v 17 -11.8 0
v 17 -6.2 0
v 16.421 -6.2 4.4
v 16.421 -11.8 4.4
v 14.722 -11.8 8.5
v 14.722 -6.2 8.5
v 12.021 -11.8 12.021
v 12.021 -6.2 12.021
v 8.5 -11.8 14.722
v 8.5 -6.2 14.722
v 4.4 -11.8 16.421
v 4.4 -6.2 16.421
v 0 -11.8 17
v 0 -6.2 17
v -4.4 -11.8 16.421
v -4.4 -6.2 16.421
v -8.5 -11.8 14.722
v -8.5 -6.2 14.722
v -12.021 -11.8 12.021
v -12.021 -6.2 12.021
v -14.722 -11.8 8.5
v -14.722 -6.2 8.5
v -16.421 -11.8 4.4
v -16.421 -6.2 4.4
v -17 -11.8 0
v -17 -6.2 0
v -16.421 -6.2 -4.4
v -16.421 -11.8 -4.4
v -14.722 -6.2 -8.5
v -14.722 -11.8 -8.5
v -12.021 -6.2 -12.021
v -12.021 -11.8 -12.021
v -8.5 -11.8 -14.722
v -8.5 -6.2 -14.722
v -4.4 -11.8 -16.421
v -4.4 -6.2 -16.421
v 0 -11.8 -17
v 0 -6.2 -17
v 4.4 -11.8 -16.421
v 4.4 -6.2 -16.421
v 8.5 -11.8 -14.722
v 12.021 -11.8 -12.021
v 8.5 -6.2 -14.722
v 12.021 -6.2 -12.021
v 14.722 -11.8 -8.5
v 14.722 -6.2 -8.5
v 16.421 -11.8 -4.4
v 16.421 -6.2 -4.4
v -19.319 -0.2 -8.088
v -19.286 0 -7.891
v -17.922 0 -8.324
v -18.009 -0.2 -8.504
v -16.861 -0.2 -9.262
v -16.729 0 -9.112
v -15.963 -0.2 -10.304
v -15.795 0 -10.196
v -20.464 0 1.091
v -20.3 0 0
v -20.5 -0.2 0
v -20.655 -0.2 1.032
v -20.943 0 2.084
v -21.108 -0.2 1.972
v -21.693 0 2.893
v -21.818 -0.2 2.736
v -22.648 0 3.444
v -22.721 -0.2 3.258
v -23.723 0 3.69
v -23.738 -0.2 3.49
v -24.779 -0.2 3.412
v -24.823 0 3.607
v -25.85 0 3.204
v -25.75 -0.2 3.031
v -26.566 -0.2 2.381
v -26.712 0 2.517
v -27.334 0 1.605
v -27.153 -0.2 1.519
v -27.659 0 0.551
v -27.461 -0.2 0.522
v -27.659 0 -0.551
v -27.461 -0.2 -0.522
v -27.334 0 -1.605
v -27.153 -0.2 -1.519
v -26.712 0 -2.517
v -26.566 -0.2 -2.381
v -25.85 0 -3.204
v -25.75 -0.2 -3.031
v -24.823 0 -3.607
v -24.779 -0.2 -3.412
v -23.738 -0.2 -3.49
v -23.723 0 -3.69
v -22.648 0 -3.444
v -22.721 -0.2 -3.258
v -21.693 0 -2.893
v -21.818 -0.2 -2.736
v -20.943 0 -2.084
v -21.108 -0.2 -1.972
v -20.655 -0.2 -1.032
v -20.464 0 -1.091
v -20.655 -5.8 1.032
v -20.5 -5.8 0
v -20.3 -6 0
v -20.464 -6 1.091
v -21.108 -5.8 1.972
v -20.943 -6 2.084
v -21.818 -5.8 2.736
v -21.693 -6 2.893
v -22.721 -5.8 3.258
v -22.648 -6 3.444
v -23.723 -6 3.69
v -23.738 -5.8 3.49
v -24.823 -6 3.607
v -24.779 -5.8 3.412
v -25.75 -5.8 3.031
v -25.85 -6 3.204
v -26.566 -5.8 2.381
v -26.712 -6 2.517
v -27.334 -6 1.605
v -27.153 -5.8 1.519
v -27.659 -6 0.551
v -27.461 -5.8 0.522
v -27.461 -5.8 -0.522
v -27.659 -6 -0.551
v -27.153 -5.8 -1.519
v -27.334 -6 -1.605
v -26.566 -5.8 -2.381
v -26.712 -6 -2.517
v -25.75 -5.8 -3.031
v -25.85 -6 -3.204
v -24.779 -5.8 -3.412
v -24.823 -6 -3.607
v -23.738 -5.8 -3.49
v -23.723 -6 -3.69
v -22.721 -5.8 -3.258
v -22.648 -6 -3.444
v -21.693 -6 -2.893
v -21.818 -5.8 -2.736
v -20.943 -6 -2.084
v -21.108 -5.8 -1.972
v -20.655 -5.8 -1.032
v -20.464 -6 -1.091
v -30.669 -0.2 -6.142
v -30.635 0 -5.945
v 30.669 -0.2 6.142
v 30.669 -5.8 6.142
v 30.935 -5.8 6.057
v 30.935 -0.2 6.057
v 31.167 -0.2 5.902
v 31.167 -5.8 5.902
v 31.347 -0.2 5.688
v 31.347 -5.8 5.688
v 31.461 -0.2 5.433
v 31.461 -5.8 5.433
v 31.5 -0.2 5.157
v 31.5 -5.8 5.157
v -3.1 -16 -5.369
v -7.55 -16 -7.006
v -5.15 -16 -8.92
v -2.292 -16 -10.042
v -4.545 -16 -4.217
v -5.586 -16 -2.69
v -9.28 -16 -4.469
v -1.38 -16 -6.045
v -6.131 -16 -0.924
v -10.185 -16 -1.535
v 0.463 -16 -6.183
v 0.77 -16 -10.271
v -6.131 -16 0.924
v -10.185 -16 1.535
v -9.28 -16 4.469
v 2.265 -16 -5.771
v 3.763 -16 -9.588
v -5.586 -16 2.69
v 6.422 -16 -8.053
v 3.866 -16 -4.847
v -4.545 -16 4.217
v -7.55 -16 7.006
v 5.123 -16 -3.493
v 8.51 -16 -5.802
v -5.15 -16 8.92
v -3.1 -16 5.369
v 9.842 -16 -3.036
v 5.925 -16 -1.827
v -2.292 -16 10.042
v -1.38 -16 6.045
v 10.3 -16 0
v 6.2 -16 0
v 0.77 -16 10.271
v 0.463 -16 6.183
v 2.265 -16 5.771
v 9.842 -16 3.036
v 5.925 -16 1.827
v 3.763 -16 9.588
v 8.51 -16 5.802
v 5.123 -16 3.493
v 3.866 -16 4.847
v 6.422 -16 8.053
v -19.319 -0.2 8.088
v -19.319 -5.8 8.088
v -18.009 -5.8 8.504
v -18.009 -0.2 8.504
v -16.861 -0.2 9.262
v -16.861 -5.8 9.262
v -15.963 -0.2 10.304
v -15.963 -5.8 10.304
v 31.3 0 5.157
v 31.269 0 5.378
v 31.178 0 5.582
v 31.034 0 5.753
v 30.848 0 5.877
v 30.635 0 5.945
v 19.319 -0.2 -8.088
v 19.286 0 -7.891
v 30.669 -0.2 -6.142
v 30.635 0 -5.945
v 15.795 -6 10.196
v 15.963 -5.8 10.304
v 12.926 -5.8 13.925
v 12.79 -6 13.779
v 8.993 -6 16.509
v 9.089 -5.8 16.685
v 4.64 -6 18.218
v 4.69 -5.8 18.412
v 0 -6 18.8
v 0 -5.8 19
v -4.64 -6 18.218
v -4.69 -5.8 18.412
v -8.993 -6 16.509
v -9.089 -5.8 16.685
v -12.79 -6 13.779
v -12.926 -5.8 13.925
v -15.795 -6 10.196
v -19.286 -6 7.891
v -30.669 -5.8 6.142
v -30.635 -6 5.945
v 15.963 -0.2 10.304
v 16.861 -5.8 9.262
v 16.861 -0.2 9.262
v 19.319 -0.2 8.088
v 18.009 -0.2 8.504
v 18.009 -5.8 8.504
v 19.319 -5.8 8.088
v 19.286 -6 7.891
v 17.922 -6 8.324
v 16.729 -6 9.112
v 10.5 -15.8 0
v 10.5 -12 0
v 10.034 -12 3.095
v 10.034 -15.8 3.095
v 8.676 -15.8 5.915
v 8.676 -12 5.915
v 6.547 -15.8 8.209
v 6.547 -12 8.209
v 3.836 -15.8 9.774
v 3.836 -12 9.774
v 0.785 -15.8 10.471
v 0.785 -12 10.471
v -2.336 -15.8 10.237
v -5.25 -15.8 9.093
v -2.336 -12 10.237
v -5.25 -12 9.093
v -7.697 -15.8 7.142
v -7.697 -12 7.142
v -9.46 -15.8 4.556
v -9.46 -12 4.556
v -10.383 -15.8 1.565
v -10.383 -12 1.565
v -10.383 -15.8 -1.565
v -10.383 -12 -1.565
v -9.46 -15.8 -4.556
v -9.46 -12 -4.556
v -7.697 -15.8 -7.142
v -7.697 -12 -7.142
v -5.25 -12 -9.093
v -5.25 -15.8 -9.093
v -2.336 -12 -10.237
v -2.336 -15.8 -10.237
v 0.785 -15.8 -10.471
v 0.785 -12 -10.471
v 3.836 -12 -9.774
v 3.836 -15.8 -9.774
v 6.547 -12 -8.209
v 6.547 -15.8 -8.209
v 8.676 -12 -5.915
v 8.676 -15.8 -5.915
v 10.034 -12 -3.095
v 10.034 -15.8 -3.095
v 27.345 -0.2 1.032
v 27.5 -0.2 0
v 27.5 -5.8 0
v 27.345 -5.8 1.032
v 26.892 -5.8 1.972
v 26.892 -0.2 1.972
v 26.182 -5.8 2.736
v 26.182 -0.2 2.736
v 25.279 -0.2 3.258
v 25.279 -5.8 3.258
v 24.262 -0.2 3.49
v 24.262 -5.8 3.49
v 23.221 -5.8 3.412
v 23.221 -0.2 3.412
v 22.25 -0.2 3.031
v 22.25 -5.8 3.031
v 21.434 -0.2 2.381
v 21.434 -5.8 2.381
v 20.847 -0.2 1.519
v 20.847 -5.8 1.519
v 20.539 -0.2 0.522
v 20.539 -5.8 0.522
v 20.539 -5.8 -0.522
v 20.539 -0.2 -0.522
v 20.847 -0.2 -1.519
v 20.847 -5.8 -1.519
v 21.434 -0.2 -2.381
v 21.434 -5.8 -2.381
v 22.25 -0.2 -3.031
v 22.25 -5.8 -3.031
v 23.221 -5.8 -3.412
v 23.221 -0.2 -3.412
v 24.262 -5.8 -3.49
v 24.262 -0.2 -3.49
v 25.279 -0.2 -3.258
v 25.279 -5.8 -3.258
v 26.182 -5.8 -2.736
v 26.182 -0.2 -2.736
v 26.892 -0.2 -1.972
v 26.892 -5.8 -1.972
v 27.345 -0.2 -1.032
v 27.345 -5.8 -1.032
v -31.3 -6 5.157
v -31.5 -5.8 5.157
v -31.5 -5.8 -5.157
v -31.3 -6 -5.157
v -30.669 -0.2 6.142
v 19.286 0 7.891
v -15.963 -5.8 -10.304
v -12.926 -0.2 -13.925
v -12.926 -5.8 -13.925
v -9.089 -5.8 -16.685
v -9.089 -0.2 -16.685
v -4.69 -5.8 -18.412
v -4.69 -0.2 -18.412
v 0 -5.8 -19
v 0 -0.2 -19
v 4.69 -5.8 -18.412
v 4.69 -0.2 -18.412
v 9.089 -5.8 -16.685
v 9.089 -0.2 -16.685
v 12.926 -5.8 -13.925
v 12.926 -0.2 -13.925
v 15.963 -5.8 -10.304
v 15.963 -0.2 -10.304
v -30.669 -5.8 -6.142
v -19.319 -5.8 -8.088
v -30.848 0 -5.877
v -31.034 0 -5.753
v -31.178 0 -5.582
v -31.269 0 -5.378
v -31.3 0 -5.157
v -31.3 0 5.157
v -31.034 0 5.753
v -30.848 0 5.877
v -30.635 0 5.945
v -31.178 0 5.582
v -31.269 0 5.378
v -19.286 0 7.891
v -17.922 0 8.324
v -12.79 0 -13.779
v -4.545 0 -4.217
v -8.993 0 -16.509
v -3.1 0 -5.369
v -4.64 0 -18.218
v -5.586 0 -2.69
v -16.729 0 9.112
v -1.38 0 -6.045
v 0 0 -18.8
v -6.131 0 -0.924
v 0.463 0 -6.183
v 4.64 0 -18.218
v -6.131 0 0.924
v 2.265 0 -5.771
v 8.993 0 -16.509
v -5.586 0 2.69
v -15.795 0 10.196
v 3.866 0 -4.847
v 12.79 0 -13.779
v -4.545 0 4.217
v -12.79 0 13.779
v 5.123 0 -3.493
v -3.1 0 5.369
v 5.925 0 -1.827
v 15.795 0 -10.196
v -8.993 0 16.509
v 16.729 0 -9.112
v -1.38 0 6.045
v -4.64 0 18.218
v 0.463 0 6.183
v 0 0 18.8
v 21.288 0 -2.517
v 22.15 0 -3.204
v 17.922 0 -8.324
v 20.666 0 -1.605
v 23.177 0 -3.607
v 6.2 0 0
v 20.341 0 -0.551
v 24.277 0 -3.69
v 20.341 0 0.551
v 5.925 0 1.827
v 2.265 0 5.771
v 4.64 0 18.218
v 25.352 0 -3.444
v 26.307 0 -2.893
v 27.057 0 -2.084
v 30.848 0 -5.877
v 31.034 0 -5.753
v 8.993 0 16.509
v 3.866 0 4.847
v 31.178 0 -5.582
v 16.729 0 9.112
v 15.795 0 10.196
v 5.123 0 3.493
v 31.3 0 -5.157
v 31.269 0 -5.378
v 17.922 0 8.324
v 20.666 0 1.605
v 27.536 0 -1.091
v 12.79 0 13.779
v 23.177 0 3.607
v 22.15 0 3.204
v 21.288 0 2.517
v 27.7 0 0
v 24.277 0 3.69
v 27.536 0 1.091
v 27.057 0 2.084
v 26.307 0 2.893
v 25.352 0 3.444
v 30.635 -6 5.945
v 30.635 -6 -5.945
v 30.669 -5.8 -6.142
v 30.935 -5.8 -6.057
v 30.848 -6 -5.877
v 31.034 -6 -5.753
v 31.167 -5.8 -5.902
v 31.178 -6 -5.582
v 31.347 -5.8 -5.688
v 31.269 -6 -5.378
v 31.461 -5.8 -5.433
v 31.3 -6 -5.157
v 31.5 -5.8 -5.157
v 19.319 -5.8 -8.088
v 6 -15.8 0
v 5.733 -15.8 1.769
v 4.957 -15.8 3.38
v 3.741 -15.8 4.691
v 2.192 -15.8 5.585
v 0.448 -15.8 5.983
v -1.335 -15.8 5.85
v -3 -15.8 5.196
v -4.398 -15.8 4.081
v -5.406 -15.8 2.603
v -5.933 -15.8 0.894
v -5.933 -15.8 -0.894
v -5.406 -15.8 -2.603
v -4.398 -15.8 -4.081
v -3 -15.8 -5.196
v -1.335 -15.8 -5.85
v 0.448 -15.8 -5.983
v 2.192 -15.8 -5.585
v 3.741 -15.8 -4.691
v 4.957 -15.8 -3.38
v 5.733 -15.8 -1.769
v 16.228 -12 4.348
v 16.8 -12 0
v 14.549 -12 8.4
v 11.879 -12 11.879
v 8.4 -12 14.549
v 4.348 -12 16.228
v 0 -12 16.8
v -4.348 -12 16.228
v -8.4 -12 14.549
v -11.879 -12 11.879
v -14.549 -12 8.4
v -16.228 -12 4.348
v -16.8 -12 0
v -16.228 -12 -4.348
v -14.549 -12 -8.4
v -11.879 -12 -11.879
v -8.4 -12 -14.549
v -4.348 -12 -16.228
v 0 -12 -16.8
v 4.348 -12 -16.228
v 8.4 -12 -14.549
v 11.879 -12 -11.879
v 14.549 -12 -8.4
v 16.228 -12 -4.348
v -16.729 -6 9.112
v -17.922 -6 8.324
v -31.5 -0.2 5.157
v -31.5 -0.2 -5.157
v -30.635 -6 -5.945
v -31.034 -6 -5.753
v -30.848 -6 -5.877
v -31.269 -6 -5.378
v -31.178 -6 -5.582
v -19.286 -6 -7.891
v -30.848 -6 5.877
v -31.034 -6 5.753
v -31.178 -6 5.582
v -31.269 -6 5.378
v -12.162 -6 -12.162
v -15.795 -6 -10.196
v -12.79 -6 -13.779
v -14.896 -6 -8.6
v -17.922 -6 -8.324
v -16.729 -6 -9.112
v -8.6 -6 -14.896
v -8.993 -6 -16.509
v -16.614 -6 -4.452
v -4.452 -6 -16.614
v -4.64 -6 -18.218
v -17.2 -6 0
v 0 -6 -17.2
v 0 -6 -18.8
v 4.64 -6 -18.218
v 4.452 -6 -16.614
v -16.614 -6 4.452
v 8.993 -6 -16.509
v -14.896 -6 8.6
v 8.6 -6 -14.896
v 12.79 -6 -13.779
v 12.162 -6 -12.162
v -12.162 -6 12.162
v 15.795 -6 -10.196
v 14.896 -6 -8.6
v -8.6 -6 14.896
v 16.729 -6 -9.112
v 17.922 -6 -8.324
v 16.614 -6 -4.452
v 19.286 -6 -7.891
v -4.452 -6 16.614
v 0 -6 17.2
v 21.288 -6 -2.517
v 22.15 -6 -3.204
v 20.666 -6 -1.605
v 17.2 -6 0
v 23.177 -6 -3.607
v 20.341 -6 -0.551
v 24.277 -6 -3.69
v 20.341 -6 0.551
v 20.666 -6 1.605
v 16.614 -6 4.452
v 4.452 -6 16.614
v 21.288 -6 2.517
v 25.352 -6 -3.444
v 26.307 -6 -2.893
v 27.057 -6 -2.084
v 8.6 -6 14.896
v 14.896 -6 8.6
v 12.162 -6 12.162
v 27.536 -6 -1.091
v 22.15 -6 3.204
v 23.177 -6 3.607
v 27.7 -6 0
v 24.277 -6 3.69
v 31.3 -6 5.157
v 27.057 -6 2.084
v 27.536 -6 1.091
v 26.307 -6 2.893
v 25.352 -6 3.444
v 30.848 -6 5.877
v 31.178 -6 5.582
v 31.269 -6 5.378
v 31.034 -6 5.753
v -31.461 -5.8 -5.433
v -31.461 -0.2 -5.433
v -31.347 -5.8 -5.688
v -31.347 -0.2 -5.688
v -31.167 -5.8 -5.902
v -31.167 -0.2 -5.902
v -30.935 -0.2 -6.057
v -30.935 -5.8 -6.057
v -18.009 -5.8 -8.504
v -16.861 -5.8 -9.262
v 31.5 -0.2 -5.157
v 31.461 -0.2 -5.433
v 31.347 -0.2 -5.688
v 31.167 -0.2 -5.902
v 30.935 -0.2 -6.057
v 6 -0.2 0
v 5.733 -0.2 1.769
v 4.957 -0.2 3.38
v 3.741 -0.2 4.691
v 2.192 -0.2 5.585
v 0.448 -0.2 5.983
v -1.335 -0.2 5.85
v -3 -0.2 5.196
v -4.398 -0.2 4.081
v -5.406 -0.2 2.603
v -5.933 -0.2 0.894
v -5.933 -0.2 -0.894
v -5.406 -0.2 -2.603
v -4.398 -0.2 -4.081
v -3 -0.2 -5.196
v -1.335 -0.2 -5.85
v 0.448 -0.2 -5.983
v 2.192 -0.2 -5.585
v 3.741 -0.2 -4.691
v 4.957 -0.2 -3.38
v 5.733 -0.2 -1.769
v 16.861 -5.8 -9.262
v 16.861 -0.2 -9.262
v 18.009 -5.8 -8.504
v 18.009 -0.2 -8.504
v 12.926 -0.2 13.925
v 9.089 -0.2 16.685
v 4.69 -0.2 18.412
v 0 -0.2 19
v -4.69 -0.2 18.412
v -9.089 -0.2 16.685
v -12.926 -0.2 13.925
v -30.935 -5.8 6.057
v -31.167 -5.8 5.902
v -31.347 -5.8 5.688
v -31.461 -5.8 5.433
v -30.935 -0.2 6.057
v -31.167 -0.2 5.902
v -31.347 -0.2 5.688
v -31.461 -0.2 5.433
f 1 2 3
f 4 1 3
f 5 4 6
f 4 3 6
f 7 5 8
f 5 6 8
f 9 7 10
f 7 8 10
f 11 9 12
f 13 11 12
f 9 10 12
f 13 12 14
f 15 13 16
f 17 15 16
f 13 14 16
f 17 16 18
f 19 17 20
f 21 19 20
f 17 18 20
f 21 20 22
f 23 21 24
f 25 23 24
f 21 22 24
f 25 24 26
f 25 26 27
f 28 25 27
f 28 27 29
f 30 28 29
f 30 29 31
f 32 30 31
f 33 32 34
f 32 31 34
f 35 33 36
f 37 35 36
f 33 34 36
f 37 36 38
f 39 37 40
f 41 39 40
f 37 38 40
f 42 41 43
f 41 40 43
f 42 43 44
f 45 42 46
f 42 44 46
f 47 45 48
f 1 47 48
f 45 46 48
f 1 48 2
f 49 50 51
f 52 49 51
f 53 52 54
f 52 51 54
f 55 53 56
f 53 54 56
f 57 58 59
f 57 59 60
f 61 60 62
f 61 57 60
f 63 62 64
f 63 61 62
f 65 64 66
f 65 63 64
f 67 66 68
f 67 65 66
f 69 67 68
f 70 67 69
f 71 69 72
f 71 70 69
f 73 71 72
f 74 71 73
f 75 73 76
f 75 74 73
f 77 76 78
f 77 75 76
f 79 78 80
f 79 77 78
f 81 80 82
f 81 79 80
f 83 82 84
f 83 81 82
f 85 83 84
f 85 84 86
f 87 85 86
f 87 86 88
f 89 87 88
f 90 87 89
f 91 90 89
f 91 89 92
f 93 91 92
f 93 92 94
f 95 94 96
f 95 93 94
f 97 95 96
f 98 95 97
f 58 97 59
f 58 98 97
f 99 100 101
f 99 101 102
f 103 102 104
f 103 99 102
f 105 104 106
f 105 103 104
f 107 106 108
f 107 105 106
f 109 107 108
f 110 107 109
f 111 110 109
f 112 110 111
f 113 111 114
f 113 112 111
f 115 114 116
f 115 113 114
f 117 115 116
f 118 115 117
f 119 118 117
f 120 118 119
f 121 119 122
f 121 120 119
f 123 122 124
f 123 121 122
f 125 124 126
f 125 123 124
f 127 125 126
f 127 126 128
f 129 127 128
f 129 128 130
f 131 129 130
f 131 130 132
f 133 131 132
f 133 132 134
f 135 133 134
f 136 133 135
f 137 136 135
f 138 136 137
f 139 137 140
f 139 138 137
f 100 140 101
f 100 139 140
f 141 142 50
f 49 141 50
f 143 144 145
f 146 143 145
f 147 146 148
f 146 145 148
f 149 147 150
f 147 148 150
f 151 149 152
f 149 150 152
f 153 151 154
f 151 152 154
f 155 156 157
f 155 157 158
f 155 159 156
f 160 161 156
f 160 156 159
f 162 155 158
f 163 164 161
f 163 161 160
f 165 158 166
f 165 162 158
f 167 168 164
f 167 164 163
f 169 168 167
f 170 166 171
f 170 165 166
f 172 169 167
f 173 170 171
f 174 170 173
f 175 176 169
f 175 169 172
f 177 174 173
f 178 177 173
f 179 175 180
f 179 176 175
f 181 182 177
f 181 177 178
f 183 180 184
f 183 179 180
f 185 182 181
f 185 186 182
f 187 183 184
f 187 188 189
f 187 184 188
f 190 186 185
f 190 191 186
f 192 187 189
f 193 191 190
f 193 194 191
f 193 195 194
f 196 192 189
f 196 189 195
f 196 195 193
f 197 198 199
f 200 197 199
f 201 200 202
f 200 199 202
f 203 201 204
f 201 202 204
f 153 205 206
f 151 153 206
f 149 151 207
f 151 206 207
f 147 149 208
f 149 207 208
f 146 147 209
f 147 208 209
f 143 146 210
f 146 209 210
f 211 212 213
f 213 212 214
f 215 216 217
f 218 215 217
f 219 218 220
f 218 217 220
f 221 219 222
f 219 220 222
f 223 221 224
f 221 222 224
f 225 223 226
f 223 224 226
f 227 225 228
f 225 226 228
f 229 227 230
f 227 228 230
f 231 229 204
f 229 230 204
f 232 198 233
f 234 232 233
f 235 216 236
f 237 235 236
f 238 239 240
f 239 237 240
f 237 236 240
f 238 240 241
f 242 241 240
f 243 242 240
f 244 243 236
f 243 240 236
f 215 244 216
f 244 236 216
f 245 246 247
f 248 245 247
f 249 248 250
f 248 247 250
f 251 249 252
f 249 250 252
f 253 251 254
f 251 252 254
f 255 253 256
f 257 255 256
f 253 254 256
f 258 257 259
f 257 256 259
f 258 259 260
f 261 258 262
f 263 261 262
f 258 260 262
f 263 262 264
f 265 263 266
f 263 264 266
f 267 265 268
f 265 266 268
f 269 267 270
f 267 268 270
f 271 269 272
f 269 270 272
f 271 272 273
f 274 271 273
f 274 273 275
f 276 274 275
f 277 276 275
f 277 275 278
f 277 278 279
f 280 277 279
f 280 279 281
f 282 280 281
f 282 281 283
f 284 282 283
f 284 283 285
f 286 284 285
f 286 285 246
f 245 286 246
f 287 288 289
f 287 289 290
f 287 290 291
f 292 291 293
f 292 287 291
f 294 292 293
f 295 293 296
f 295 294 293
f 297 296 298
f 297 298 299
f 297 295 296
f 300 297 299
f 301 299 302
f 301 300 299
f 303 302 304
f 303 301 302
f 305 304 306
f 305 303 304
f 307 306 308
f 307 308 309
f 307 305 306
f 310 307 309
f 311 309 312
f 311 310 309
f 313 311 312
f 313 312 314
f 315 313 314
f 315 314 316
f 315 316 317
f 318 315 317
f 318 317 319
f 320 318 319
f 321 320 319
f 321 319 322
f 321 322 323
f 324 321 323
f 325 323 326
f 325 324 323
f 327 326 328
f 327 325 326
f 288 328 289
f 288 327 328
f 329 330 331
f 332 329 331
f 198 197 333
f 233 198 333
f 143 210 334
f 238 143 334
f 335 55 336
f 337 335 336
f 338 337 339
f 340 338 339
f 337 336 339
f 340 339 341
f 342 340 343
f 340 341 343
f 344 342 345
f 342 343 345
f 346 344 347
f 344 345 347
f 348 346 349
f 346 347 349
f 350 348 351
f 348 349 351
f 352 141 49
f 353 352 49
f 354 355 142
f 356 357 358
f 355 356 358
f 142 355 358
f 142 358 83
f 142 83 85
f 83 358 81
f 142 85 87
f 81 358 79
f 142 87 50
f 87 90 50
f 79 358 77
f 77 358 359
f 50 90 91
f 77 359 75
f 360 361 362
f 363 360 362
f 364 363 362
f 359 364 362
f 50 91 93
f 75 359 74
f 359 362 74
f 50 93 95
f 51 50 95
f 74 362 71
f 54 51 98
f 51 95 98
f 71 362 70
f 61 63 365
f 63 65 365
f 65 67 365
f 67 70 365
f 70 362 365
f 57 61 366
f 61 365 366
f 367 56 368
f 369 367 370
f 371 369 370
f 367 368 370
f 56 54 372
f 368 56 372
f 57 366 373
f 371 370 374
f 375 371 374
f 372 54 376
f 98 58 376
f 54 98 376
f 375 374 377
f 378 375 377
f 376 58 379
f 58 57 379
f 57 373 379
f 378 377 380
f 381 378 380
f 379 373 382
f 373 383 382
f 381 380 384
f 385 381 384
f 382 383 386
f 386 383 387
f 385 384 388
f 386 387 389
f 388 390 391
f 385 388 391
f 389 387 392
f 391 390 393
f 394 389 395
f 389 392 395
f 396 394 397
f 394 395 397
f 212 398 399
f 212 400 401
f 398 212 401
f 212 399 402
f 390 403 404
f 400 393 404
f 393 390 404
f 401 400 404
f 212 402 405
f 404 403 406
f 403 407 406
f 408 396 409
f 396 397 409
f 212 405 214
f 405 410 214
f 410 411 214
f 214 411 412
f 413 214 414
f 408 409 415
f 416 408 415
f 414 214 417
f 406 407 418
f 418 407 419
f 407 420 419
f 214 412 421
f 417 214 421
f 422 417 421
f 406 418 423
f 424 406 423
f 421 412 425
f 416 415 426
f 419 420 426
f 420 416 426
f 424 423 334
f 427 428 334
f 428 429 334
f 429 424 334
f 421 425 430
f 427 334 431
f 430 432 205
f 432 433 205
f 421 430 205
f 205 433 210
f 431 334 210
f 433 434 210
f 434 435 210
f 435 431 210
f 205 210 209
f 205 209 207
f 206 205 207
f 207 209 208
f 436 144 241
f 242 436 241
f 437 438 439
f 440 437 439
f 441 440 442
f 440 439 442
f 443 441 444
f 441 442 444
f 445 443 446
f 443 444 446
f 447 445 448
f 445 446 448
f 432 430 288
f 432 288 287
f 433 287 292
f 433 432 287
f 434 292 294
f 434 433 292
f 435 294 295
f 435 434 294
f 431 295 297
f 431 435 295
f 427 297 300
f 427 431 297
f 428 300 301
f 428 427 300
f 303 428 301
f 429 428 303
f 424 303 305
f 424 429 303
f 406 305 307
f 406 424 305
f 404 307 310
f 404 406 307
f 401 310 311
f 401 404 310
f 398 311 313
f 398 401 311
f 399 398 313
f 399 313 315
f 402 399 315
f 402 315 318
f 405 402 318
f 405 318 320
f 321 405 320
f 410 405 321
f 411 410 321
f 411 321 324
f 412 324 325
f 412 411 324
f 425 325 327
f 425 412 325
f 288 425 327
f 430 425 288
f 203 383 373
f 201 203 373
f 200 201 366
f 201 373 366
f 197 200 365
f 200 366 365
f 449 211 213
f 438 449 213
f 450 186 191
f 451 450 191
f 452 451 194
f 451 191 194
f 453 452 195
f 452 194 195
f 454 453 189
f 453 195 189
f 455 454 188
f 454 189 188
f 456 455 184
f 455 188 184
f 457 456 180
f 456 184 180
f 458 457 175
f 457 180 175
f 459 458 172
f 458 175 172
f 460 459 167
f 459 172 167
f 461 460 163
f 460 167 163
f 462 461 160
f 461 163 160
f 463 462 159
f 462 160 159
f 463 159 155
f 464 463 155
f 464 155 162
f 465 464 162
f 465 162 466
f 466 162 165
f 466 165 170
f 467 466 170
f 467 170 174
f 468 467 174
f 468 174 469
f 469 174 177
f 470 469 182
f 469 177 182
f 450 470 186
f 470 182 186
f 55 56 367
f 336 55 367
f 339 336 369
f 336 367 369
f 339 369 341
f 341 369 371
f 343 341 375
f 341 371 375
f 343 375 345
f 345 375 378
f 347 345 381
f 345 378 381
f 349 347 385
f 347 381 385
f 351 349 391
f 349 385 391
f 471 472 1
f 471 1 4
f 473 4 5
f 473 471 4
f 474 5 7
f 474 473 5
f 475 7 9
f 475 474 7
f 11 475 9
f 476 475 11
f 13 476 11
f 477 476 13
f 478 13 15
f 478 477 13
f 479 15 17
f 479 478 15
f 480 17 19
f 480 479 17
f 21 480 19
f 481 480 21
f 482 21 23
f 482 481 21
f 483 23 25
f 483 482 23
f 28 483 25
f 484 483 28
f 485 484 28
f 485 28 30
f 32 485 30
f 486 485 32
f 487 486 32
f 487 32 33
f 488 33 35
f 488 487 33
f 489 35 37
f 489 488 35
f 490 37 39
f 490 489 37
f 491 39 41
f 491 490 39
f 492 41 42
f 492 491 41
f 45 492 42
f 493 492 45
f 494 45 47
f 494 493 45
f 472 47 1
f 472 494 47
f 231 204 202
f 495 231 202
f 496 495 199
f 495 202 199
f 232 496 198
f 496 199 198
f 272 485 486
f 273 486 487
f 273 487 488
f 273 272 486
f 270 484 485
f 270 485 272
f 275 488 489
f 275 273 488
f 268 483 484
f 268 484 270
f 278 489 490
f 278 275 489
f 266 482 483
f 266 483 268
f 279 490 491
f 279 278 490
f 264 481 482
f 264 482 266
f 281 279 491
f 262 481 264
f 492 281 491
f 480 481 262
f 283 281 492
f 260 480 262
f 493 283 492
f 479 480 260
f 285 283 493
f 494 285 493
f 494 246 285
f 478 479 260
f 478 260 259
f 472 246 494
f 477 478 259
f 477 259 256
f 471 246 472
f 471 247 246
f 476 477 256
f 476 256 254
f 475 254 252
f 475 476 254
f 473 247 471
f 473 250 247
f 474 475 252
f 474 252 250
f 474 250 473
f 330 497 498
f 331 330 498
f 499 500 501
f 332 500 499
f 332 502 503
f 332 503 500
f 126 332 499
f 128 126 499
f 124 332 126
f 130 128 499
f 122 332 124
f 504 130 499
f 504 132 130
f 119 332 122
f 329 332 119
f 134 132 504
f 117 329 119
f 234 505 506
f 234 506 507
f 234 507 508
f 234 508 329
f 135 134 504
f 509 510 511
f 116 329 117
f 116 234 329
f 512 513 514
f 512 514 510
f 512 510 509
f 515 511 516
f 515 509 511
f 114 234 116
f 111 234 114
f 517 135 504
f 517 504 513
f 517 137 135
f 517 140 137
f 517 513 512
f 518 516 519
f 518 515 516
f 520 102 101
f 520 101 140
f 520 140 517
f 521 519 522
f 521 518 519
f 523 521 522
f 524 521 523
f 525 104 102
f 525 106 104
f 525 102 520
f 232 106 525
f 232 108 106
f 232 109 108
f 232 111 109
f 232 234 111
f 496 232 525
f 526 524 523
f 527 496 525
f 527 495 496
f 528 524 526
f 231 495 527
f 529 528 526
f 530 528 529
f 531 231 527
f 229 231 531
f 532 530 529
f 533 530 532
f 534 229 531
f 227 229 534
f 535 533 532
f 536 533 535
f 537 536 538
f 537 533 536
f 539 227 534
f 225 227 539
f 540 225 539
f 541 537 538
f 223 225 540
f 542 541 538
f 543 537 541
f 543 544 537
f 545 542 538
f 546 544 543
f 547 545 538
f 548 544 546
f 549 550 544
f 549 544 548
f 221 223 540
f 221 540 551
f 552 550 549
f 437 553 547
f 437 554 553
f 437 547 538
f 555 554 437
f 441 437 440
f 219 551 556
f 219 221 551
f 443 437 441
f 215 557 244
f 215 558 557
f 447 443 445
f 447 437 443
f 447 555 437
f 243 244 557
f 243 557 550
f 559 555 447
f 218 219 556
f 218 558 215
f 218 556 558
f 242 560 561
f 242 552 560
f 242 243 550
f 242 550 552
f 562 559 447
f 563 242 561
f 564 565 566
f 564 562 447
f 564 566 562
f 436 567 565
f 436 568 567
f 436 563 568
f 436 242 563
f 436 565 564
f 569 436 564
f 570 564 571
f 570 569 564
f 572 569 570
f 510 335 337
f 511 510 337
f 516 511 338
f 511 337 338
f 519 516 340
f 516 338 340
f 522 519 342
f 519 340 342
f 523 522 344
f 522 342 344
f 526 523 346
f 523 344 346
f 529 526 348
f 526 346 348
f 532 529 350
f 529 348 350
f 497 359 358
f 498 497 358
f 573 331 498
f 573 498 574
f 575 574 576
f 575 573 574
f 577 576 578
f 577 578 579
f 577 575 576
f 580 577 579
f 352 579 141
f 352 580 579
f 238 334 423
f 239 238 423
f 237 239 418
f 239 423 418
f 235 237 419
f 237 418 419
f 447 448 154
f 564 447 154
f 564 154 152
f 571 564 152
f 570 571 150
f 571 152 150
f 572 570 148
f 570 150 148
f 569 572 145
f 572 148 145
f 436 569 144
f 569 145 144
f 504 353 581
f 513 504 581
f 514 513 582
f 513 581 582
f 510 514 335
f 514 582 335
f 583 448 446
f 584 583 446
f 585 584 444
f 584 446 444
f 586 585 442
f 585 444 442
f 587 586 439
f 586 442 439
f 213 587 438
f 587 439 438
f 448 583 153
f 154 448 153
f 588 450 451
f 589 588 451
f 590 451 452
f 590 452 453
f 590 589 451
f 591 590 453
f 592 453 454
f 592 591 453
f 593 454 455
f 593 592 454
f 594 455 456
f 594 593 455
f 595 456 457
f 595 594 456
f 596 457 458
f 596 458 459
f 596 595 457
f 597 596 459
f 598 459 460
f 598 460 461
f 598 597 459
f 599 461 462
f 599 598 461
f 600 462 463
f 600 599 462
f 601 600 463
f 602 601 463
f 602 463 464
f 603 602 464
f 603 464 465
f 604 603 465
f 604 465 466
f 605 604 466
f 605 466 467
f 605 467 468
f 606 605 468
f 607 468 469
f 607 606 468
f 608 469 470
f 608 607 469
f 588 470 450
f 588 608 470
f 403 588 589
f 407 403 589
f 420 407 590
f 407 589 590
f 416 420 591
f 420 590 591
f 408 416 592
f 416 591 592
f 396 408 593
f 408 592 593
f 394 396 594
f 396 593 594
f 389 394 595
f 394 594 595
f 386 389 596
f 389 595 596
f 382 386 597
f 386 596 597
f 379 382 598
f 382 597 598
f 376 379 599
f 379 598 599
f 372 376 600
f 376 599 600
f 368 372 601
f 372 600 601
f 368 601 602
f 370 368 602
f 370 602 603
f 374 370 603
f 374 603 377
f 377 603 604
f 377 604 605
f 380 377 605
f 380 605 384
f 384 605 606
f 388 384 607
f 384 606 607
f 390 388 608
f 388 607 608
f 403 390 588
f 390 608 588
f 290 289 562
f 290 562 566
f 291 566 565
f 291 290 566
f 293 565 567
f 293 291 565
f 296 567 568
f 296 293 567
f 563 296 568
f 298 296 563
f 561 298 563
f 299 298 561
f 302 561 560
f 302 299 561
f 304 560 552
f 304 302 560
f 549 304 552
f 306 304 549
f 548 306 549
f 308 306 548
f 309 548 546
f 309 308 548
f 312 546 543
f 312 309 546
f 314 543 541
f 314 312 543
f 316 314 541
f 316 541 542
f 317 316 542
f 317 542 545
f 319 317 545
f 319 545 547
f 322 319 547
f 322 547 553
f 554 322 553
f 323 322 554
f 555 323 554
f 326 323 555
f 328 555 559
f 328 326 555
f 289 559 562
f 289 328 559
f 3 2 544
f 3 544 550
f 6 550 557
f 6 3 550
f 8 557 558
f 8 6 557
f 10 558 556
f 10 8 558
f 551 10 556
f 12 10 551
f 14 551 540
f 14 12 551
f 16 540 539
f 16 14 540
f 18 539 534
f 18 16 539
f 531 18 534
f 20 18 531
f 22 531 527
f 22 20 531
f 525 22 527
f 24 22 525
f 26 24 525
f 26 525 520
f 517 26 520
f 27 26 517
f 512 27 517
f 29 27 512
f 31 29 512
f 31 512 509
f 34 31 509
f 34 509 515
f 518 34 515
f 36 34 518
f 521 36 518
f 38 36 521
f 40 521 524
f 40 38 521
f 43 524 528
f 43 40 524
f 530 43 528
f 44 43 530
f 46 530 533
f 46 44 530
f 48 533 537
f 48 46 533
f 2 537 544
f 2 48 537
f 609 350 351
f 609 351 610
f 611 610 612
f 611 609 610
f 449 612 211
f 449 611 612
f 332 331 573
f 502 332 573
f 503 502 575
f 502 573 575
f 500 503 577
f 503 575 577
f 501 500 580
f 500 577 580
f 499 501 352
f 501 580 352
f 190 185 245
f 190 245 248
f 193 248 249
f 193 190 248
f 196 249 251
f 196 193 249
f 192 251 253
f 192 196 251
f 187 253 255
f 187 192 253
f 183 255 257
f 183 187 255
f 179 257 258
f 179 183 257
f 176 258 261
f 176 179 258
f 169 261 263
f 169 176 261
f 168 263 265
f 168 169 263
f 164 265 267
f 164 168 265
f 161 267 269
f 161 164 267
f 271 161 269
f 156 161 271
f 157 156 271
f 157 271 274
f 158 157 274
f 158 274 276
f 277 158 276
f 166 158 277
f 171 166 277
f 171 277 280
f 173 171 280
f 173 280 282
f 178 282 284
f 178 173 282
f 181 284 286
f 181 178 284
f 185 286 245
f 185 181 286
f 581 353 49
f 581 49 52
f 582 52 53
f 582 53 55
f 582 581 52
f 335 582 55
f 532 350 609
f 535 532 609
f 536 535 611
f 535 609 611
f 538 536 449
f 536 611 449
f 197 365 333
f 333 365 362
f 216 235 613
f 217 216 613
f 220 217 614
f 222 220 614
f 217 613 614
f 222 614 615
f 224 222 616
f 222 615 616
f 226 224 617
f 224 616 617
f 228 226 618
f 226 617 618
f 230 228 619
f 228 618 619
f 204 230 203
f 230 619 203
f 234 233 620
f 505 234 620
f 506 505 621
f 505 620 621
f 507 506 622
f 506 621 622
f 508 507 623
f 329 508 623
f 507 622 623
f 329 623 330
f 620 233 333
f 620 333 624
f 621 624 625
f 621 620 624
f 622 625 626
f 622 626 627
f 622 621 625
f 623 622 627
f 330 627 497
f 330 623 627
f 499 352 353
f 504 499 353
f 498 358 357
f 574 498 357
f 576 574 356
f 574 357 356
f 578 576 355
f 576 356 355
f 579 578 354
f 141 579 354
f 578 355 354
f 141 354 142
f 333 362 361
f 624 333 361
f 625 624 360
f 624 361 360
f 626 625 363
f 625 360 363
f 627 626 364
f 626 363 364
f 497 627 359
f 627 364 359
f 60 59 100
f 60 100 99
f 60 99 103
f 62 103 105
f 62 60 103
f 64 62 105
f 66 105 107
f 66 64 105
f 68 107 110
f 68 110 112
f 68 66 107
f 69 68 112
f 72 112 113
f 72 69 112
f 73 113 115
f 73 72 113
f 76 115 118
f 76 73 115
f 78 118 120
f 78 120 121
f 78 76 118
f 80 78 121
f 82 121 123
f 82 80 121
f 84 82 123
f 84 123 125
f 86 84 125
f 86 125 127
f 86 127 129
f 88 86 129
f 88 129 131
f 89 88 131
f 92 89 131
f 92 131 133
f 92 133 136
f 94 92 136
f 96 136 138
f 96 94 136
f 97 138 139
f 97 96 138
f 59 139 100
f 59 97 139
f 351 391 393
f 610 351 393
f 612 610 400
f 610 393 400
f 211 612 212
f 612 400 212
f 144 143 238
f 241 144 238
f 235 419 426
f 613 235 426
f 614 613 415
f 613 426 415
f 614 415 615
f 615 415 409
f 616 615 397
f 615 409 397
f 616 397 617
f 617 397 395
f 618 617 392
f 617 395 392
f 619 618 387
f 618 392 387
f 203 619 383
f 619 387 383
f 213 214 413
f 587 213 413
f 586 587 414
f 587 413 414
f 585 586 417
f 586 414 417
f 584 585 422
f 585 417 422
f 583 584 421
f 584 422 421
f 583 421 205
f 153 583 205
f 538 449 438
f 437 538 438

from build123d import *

# Parameters (mm, degrees)
F0_R     = 3.5
F0_R_2   = 10.5
F1_DEPTH = 6
F2_R     = 10.5
F2_R_2   = 6
F3_DEPTH = 16
F4_R     = 17
F4_R_2   = 10.5
F5_DEPTH = 6
F6_R     = 5
F7_R     = 1
F8_SIZE  = 0.2
F9_SIZE  = 0.2


with BuildPart() as f1:
    # F0 (on Front) → F1 (new body)
    with BuildSketch(Plane.XZ):
        with BuildLine():
            Line((-31.5, 6), (-31.5, -6))
            Line((-31.5, -6), (-17, -8.485281))
            ThreePointArc((-17, -8.485281), (-19, 0), (-17, 8.485281))
            Line((-17, 8.485281), (-31.5, 6))
        make_face()
        with Locations((-24, 0)):
            Circle(F0_R, mode=Mode.SUBTRACT)
        with BuildLine():
            ThreePointArc((-17, 8.485281), (-19, 0), (-17, -8.485281))
            ThreePointArc((-17, -8.485281), (0, -19), (17, -8.485281))
            ThreePointArc((17, -8.485281), (18.493242, -4.358899), (19, 0))
            ThreePointArc((19, 0), (18.493242, 4.358899), (17, 8.485281))
            ThreePointArc((17, 8.485281), (0, 19), (-17, 8.485281))
        make_face()
        Circle(F0_R_2, mode=Mode.SUBTRACT)
        with BuildLine():
            ThreePointArc((19, 0), (18.493242, -4.358899), (17, -8.485281))
            Line((17, -8.485281), (31.5, -6))
            Line((31.5, -6), (31.5, 6))
            Line((31.5, 6), (17, 8.485281))
            ThreePointArc((17, 8.485281), (18.493242, 4.358899), (19, 0))
        make_face()
        with Locations((24, 0)):
            Circle(F0_R, mode=Mode.SUBTRACT)
    extrude(amount=F1_DEPTH)

    # F2 (on Front) → F3 (join)
    with BuildSketch(Plane.XZ):
        Circle(F2_R)
        Circle(F2_R_2, mode=Mode.SUBTRACT)
    extrude(amount=F3_DEPTH)

    # F4 (on face) → F5 (join)
    with BuildSketch(Plane.XZ.offset(6)):
        Circle(F4_R)
        Circle(F4_R_2, mode=Mode.SUBTRACT)
    extrude(amount=F5_DEPTH)

    # F6
    f6_edges = [f1.edges().sort_by_distance(p)[0] for p in [
        (-17, -3, -8.485281),
        (17, -3, -8.485281),
        (17, -3, 8.485281),
        (-17, -3, 8.485281),
    ]]
    fillet(f6_edges, radius=F6_R)

    # F7
    f7_edges = [f1.edges().sort_by_distance(p)[0] for p in [
        (-31.5, -3, -6),
        (31.5, -3, -6),
        (31.5, -3, 6),
        (-31.5, -3, 6),
    ]]
    fillet(f7_edges, radius=F7_R)

    # F8
    f8_edges = [f1.edges().sort_by_distance(p)[0] for p in [
        (-17, -12, 0),
        (24.994126, -6, -7.115098),
        (31.264505, -6, -5.801434),
        (17.408545, -6, -8.843659),
        (31.5, -6, 0),
        (0, -6, -19),
        (31.264505, -6, 5.801434),
        (-17.408545, -6, -8.843659),
        (24.994126, -6, 7.115098),
        (-24.994126, -6, -7.115098),
        (17.408545, -6, 8.843659),
        (-31.264505, -6, -5.801434),
        (0, -6, 19),
        (-31.5, -6, 0),
        (-17.408545, -6, 8.843659),
        (-31.264505, -6, 5.801434),
        (-24.994126, -6, 7.115098),
        (-27.5, -6, 0),
        (-17, -6, 0),
        (20.5, -6, 0),
        (24.994126, 0, 7.115098),
        (31.264505, 0, 5.801434),
        (17.408545, 0, 8.843659),
        (31.5, 0, 0),
        (0, 0, 19),
        (31.264505, 0, -5.801434),
        (-17.408545, 0, 8.843659),
        (24.994126, 0, -7.115098),
        (-24.994126, 0, 7.115098),
        (17.408545, 0, -8.843659),
        (-31.264505, 0, 5.801434),
        (0, 0, -19),
        (-31.5, 0, 0),
        (-17.408545, 0, -8.843659),
        (-31.264505, 0, -5.801434),
        (-24.994126, 0, -7.115098),
        (-27.5, 0, 0),
        (20.5, 0, 0),
        (-6, 0, 0),
    ]]
    chamfer(f8_edges, length=F8_SIZE)

    # F9
    f9_edges = [f1.edges().sort_by_distance(p)[0] for p in [
        (-10.5, -16, 0),
        (-6, -16, 0),
    ]]
    chamfer(f9_edges, length=F9_SIZE)


solid = f1.part
